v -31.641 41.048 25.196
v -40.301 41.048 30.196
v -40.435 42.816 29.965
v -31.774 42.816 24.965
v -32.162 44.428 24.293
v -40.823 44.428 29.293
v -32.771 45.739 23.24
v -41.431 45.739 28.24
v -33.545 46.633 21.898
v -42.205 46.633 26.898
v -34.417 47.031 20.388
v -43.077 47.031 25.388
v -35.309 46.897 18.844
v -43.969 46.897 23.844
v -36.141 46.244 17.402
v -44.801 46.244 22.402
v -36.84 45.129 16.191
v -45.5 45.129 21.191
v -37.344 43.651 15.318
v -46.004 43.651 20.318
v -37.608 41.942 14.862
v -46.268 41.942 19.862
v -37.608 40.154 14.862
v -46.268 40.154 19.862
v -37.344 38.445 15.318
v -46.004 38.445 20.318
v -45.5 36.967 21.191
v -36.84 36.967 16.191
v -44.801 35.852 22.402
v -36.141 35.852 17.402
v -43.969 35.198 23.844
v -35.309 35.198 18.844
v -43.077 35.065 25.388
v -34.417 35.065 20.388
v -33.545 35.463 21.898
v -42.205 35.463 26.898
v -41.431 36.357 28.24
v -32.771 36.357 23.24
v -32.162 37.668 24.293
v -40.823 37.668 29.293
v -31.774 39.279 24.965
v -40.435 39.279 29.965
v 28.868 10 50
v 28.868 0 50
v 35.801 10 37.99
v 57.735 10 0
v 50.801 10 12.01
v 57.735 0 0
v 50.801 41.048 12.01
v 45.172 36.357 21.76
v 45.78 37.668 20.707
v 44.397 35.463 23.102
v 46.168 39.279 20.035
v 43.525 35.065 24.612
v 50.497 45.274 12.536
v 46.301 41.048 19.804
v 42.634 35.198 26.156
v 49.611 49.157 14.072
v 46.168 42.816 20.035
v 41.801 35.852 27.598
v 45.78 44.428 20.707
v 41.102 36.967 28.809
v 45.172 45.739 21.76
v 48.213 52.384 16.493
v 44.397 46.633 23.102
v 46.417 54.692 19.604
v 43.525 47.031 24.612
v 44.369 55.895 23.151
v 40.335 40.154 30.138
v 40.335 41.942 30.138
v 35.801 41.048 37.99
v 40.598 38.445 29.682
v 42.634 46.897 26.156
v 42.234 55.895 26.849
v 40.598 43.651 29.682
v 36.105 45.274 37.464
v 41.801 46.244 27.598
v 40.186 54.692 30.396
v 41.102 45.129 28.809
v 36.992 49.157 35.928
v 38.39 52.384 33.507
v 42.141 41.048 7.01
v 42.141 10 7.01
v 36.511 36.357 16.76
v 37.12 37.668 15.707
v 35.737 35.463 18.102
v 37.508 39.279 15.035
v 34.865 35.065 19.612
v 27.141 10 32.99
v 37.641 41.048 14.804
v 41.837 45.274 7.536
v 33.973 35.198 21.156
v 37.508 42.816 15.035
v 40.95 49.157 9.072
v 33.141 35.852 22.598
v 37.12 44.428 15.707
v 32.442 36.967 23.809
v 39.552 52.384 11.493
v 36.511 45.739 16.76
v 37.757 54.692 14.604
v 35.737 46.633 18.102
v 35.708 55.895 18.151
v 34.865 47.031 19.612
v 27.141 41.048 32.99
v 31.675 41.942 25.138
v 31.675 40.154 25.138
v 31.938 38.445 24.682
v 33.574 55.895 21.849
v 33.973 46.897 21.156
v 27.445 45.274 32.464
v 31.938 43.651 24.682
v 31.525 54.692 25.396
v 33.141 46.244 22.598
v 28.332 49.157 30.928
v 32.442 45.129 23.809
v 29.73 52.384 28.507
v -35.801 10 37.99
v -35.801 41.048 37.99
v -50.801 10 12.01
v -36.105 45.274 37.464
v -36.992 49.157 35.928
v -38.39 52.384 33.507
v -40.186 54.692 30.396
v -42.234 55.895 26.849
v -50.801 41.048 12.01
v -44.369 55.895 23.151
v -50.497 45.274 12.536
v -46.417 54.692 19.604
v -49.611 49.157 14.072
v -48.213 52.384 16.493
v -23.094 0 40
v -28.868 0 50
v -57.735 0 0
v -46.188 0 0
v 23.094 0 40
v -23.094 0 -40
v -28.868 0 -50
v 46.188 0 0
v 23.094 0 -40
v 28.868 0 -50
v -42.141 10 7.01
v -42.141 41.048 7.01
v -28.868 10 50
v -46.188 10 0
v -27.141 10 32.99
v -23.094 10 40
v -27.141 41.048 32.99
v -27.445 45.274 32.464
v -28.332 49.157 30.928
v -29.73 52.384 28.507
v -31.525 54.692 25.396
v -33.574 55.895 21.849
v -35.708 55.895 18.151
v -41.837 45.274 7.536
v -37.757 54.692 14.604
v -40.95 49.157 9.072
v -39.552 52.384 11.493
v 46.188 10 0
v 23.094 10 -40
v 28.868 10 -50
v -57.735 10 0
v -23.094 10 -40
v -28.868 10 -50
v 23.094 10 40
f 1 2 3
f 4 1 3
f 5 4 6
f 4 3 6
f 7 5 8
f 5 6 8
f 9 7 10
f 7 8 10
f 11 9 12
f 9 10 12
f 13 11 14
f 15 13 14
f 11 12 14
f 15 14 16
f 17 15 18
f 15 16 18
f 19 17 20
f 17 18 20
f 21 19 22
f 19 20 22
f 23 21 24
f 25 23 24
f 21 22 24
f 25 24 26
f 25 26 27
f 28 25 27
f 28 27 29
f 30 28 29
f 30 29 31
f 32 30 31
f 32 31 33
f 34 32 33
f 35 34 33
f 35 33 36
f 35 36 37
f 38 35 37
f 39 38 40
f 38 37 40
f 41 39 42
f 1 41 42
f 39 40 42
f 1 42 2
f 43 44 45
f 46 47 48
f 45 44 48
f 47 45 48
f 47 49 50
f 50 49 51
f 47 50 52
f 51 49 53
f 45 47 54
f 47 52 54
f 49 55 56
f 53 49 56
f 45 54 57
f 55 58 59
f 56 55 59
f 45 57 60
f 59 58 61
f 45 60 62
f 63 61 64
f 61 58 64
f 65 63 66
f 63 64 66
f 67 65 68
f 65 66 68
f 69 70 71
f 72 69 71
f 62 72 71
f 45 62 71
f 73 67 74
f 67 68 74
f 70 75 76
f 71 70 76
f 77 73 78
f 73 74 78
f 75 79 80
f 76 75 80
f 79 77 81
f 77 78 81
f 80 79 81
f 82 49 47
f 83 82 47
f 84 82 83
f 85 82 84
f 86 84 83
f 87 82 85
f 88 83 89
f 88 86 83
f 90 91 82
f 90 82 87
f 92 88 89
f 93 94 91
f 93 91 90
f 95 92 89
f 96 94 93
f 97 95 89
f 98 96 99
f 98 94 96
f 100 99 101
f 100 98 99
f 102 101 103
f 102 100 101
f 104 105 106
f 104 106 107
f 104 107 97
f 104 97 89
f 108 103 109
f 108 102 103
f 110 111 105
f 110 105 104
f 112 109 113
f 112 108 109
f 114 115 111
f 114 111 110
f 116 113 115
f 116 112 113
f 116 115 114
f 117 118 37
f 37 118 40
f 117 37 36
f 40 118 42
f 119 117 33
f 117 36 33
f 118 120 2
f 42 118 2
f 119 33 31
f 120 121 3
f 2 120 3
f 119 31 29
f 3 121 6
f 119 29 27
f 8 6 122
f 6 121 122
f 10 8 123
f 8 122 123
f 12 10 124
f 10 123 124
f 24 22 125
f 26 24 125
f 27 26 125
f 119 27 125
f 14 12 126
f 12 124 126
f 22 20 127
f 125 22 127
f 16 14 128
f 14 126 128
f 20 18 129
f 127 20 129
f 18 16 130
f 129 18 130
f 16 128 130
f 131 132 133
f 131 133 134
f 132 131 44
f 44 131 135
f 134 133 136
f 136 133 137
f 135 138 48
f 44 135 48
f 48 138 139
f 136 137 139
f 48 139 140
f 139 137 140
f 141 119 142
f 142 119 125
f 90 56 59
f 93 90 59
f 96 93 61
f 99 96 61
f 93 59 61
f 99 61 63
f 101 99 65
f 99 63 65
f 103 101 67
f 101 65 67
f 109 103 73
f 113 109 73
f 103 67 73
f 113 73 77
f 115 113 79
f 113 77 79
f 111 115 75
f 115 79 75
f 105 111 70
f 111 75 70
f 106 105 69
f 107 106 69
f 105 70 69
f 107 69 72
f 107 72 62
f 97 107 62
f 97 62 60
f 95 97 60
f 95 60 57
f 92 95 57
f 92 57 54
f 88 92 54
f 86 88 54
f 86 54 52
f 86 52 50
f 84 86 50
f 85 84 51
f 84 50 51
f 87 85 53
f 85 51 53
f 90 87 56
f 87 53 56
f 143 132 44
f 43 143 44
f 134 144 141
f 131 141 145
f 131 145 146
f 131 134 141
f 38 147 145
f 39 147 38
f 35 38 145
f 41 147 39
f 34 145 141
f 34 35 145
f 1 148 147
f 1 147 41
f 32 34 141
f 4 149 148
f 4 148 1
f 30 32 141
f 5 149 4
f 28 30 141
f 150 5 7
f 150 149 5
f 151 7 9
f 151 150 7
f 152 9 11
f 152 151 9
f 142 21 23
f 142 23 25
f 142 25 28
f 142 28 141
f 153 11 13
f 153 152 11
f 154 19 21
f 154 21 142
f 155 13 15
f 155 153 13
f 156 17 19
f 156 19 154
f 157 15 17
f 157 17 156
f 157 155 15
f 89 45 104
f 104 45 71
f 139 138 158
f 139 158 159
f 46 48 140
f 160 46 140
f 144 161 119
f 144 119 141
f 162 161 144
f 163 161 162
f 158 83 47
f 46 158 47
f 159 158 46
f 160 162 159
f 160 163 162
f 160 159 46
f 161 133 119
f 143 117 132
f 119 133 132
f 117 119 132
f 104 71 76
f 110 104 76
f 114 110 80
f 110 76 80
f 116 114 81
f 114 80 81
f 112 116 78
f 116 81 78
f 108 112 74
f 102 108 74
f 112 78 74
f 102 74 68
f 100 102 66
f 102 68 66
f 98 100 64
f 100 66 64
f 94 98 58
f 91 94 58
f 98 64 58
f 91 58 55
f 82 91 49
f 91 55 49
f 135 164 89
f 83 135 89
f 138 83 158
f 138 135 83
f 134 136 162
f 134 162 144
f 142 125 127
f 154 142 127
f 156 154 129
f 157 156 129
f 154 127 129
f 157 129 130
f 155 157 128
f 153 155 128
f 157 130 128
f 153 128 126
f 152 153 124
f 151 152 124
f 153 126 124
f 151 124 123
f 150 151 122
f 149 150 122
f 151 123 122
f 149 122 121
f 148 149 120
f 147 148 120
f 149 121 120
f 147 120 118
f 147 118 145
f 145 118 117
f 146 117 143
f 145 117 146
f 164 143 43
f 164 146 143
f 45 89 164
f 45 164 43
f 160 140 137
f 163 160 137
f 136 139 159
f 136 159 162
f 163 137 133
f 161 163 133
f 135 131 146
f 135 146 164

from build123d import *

# Parameters (mm, degrees)
BOSS_EXTRUDE1_DEPTH = 10
SKETCH2_R           = 6
BOSS_EXTRUDE2_DEPTH = 10
SKETCH3_R           = 6
BOSS_EXTRUDE3_DEPTH = 10


with BuildPart() as part:
    # Sketch1 → Boss-Extrude1 (new body)
    with BuildSketch(Plane(origin=(0, 0, 0), x_dir=(1, 0, 0), z_dir=(0, 1, 0))):
        Polygon((57.735026919, 0), (28.867513459, 50), (-28.867513459, 50), (-57.735026919, 0), (-28.867513459, -50), (28.867513459, -50), align=None)
        Polygon((46.188021535, 0), (23.094010768, 40), (-23.094010768, 40), (-46.188021535, 0), (-23.094010768, -40), (23.094010768, -40), align=None, mode=Mode.SUBTRACT)
    extrude(amount=BOSS_EXTRUDE1_DEPTH)

    # Sketch2 → Boss-Extrude2 (add)
    with BuildSketch(Plane(origin=(-43.301270189, 0, 25), x_dir=(0.5000000000000071, 0, 0.8660254037844346), z_dir=(-0.8660254037844345, 0, 0.500000000000007))):
        with BuildLine():
            Line((15, 41.047826235), (15, 10))
            Line((15, 10), (-15, 10))
            Line((-15, 10), (-15, 41.047826235))
            ThreePointArc((-15, 41.047826235), (0, 56.047826235), (15, 41.047826235))
        make_face()
        with Locations((0, 41.047826235)):
            Circle(SKETCH2_R, mode=Mode.SUBTRACT)
    extrude(amount=-BOSS_EXTRUDE2_DEPTH)

    # Sketch3 → Boss-Extrude3 (add)
    with BuildSketch(Plane(origin=(43.301270189, 0, 25), x_dir=(0.4999999999999951, 0, -0.8660254037844415), z_dir=(0.8660254037844416, 0, 0.49999999999999517))):
        with BuildLine():
            Line((15, 41.047826235), (15, 10))
            Line((15, 10), (-15, 10))
            Line((-15, 10), (-15, 41.047826235))
            ThreePointArc((-15, 41.047826235), (0, 56.047826235), (15, 41.047826235))
        make_face()
        with Locations((0, 41.047826235)):
            Circle(SKETCH3_R, mode=Mode.SUBTRACT)
    extrude(amount=-BOSS_EXTRUDE3_DEPTH)


solid = part.part
